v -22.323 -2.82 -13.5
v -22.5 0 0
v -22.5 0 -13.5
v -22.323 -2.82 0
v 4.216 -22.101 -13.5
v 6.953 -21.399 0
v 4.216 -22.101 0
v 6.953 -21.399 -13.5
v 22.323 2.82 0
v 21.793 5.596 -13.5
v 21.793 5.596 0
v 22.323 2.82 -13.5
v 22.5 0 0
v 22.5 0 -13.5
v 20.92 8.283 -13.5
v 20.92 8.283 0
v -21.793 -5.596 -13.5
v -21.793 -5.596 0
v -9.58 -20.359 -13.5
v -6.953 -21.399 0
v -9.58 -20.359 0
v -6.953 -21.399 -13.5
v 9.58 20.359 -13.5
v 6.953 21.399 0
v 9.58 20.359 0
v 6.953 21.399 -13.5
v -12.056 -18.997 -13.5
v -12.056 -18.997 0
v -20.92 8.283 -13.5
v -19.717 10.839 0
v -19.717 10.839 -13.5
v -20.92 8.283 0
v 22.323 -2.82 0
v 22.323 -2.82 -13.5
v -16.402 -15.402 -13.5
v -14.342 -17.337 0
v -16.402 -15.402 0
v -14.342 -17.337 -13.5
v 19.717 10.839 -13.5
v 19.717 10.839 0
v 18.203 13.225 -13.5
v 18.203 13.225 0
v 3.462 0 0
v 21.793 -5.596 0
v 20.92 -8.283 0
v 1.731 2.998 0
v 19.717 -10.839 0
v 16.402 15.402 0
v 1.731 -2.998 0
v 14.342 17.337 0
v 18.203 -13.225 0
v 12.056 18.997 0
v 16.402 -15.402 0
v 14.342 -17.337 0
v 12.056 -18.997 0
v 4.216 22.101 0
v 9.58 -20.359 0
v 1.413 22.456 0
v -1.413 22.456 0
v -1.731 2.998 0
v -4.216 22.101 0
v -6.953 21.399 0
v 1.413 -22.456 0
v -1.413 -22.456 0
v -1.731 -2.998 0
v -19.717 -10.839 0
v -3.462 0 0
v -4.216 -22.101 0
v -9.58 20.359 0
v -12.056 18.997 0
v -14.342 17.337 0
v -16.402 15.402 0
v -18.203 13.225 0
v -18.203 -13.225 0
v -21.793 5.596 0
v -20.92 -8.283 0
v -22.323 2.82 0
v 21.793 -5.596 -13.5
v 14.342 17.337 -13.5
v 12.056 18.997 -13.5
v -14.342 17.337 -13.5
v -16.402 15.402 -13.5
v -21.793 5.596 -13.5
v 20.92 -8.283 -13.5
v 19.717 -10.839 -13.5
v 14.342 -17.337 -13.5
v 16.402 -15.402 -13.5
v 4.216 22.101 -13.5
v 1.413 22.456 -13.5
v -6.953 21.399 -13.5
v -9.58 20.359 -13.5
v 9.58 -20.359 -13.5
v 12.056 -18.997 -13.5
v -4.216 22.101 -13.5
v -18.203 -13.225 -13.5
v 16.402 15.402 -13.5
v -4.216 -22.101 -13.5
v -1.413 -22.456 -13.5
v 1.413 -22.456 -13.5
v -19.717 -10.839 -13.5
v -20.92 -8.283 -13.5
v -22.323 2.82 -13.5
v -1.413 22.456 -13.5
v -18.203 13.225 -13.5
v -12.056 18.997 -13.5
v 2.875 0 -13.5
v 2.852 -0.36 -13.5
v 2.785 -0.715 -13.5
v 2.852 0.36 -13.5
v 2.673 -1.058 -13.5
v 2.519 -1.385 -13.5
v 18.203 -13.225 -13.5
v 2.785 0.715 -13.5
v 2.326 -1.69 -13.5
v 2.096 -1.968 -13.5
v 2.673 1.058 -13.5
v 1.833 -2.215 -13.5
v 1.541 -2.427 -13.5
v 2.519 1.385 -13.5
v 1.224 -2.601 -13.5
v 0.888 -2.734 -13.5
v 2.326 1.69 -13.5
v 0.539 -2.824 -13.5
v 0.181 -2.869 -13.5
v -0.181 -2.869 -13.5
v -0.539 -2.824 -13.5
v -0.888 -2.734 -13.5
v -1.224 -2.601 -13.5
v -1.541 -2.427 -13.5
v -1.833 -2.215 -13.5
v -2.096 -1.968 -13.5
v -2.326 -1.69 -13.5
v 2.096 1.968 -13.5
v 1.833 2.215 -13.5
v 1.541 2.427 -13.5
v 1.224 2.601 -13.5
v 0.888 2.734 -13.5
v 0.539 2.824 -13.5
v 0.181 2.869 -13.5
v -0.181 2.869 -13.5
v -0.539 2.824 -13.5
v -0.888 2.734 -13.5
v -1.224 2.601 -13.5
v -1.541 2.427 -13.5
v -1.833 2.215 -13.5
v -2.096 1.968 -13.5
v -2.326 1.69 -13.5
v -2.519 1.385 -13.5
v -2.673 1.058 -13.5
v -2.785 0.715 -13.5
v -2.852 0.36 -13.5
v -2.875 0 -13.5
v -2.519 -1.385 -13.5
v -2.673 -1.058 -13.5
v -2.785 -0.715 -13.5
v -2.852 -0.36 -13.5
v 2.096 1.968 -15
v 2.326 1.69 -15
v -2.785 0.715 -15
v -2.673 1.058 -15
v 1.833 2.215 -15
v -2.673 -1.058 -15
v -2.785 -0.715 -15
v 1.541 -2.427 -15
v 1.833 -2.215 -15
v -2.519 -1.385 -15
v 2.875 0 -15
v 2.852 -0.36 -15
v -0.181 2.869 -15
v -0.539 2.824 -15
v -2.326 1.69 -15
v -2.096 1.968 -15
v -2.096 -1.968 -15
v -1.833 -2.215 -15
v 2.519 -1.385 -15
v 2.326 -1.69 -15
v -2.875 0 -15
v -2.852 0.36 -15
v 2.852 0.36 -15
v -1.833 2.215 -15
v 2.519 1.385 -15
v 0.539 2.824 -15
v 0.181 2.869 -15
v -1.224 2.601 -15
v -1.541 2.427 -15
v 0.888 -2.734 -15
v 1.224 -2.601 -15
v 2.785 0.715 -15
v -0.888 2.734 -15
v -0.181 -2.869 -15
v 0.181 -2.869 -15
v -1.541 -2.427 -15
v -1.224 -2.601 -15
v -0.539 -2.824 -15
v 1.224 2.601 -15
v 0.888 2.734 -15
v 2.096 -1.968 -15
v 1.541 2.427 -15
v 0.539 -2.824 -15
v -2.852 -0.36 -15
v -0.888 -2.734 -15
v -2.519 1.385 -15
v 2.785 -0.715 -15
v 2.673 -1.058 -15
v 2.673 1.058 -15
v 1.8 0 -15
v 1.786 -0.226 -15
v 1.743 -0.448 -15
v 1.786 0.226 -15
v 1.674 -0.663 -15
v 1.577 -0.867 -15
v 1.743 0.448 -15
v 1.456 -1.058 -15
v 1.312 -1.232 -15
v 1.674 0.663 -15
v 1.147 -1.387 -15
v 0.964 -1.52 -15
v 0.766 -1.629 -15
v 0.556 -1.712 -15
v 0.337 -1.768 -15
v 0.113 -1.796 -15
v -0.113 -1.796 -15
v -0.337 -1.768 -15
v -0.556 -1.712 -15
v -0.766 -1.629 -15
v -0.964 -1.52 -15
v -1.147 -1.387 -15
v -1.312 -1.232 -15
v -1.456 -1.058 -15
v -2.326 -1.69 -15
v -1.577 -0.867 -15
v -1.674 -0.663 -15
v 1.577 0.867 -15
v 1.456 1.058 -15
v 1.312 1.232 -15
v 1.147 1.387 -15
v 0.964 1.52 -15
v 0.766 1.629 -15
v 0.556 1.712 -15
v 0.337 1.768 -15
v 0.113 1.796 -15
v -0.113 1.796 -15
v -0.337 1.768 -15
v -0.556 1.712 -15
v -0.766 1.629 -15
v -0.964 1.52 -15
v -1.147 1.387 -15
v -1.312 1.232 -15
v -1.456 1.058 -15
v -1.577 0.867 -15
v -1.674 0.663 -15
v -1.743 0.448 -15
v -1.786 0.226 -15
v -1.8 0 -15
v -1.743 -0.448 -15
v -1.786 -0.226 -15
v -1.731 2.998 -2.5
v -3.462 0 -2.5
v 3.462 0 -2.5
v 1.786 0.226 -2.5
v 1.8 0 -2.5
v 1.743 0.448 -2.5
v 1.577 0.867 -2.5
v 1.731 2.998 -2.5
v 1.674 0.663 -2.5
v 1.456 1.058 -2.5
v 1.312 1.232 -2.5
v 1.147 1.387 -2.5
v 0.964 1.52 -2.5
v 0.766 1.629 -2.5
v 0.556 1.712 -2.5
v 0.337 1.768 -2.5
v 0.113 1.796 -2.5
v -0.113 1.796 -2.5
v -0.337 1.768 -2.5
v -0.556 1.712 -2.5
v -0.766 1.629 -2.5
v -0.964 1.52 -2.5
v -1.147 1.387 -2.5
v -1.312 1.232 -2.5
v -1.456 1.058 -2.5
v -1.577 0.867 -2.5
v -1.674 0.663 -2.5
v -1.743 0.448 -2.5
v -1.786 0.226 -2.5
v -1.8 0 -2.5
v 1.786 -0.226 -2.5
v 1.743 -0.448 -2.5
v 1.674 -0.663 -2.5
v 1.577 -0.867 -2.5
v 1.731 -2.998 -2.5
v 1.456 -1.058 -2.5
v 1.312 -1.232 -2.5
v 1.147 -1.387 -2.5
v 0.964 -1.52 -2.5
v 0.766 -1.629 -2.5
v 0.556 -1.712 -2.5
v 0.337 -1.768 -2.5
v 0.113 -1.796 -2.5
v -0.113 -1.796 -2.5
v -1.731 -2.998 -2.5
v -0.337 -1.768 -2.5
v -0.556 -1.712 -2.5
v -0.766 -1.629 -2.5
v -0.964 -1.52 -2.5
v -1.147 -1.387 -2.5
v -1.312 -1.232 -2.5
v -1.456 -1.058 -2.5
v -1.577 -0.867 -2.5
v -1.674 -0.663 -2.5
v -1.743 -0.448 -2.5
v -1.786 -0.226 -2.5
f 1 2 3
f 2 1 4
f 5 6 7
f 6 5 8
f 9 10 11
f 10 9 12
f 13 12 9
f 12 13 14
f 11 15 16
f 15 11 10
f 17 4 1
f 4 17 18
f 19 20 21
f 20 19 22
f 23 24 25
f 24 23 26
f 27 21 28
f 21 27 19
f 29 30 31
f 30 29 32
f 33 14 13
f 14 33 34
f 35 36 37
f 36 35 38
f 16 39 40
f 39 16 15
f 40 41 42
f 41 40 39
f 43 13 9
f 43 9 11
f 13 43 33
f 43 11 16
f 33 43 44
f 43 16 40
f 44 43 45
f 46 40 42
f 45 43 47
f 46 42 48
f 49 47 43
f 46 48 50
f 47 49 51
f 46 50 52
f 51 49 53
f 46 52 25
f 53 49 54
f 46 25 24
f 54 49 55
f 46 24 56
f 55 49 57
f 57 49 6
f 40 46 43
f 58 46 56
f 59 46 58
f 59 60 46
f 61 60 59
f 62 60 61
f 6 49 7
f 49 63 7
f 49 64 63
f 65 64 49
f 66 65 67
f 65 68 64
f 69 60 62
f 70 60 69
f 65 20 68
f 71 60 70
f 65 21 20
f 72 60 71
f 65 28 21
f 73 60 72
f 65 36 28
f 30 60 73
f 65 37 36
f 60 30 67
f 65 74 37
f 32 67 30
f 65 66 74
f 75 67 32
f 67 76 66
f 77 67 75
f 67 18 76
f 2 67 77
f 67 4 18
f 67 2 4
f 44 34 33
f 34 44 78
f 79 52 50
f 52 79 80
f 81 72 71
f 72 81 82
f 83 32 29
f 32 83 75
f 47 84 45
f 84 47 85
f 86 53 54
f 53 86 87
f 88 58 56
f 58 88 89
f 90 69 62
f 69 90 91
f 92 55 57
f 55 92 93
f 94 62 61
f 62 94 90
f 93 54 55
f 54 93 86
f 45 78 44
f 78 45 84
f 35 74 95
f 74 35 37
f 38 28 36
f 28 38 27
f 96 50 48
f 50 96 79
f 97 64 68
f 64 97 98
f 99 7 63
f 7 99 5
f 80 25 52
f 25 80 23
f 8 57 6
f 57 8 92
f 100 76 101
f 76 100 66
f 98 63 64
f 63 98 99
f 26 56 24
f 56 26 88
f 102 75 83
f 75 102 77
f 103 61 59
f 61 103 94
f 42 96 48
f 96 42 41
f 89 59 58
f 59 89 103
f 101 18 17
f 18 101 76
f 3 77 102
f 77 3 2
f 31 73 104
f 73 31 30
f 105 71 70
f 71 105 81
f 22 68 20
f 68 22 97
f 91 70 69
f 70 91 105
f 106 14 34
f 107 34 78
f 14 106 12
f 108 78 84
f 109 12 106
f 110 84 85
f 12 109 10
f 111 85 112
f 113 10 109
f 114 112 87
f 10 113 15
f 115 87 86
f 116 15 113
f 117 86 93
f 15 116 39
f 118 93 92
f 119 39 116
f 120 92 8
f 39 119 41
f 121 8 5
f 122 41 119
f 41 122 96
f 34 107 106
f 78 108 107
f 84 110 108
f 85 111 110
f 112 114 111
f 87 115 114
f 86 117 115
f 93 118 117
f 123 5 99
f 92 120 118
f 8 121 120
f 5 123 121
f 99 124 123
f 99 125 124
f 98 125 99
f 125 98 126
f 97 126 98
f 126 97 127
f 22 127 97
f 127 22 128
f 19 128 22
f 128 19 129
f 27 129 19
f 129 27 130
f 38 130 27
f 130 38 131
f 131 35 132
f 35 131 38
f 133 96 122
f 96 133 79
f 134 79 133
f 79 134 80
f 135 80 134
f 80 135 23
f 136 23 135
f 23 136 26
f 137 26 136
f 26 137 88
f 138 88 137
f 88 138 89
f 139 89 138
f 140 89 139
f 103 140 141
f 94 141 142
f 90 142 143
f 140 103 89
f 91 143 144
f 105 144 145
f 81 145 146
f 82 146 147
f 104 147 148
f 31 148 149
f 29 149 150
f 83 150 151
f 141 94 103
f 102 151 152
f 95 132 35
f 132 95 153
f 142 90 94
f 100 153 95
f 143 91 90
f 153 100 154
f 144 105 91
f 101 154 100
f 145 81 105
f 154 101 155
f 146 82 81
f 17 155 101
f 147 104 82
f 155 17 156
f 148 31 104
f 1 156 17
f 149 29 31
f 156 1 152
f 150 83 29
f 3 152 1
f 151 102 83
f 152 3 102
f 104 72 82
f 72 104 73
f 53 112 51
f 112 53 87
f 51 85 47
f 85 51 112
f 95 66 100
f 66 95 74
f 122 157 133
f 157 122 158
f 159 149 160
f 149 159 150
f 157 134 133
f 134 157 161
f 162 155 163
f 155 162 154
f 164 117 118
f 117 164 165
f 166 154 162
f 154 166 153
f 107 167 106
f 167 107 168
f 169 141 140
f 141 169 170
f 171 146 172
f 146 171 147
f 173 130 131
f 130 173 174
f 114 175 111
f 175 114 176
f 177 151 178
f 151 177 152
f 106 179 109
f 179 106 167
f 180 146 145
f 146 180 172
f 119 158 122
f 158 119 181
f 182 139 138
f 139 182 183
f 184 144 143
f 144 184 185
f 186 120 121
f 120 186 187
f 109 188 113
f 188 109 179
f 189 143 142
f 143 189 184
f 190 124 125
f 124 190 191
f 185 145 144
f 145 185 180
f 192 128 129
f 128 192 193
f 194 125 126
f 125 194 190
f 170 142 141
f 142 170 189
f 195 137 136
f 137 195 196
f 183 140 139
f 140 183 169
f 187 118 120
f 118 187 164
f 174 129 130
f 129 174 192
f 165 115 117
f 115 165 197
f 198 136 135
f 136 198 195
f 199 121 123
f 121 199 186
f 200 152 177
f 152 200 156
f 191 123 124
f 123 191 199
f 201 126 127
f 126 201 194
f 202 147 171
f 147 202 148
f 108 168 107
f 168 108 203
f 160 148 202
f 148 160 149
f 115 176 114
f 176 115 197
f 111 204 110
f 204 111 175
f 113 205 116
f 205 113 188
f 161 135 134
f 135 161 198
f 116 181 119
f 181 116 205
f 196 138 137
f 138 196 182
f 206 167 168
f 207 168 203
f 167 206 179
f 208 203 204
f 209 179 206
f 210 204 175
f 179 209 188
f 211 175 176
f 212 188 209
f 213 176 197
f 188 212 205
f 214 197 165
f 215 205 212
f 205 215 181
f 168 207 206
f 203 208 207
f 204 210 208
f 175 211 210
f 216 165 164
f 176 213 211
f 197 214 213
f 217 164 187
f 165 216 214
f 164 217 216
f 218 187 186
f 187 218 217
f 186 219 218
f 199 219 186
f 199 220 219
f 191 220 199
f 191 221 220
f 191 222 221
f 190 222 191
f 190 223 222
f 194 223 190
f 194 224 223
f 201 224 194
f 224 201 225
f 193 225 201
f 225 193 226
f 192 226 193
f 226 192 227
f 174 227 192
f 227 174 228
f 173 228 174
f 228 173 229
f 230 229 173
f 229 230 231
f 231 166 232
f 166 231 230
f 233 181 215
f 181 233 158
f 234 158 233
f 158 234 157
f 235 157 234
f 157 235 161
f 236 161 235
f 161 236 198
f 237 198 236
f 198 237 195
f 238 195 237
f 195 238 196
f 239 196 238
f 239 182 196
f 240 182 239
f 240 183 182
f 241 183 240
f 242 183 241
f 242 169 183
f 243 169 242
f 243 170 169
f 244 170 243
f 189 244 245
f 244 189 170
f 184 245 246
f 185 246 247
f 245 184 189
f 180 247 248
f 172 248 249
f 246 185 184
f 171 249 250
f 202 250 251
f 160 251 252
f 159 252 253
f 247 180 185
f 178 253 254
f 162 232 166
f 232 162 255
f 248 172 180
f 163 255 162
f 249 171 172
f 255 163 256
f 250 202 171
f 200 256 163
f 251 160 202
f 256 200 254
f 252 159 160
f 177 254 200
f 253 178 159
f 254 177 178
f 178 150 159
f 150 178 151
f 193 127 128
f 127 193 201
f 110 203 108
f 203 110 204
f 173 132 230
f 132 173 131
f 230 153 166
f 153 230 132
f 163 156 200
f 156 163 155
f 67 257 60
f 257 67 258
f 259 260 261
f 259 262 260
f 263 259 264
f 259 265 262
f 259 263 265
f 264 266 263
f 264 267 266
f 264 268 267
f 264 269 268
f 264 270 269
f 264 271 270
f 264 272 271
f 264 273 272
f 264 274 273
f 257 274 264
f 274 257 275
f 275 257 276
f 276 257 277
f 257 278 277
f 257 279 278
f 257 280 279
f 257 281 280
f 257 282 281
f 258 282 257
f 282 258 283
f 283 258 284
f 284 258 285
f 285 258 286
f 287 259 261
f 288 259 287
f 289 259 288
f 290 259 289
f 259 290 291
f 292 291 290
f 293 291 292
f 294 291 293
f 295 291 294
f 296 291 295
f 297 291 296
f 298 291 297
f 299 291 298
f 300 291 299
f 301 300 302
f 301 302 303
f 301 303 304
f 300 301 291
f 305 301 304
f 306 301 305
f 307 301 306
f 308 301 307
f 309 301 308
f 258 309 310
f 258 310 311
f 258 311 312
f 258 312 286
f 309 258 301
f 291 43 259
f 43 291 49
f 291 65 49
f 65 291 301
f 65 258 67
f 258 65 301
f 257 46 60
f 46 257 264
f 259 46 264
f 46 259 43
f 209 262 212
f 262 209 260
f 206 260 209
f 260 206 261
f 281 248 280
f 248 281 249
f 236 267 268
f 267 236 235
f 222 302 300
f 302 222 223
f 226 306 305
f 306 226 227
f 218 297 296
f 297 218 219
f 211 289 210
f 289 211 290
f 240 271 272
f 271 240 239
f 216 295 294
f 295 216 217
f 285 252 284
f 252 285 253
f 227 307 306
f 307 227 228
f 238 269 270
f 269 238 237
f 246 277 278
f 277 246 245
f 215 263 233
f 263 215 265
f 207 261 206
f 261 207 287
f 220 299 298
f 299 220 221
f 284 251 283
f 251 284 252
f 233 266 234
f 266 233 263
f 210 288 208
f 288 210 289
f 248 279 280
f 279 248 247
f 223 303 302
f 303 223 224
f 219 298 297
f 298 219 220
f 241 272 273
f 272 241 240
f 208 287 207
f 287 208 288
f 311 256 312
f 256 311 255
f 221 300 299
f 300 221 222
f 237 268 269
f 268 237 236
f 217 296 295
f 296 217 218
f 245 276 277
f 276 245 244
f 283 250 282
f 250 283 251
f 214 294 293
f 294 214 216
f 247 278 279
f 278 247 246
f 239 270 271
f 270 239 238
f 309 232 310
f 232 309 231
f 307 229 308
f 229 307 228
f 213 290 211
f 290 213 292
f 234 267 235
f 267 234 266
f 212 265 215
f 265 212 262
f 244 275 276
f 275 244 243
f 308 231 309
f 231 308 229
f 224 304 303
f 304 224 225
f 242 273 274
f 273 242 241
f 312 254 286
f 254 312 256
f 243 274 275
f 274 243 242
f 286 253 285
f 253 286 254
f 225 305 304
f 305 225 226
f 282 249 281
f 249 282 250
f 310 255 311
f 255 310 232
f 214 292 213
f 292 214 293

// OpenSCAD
$fn = 50;

difference() {
	union() {
		translate(v = [0, 0, -13.5]) {
			cylinder(h = 13.5, r = 22.5);
		}
		#translate(v = [0, 0, -15.0]) {
			cylinder(h = 15, r = 2.875);
		}
	}
	union() {
		translate(v = [0, 0, 0]) {
			rotate(a = [0, 0, 0]) {
				difference() {
					union() {
						translate(v = [0, 0, -2.5]) {
							linear_extrude(height = 2.5) {
								polygon(points = [[3.4619999999999997, 0.0], [1.7310000000000003, 2.9981799479017264], [-1.7309999999999992, 2.9981799479017264], [-3.4619999999999997, 4.2397272186481365e-16], [-1.7310000000000014, -2.998179947901726], [1.7309999999999977, -2.9981799479017277]]);
							}
						}
					}
					union();
				}
			}
		}
		#translate(v = [0, 0, -100.0]) {
			cylinder(h = 200, r = 1.8);
		}
	}
}
